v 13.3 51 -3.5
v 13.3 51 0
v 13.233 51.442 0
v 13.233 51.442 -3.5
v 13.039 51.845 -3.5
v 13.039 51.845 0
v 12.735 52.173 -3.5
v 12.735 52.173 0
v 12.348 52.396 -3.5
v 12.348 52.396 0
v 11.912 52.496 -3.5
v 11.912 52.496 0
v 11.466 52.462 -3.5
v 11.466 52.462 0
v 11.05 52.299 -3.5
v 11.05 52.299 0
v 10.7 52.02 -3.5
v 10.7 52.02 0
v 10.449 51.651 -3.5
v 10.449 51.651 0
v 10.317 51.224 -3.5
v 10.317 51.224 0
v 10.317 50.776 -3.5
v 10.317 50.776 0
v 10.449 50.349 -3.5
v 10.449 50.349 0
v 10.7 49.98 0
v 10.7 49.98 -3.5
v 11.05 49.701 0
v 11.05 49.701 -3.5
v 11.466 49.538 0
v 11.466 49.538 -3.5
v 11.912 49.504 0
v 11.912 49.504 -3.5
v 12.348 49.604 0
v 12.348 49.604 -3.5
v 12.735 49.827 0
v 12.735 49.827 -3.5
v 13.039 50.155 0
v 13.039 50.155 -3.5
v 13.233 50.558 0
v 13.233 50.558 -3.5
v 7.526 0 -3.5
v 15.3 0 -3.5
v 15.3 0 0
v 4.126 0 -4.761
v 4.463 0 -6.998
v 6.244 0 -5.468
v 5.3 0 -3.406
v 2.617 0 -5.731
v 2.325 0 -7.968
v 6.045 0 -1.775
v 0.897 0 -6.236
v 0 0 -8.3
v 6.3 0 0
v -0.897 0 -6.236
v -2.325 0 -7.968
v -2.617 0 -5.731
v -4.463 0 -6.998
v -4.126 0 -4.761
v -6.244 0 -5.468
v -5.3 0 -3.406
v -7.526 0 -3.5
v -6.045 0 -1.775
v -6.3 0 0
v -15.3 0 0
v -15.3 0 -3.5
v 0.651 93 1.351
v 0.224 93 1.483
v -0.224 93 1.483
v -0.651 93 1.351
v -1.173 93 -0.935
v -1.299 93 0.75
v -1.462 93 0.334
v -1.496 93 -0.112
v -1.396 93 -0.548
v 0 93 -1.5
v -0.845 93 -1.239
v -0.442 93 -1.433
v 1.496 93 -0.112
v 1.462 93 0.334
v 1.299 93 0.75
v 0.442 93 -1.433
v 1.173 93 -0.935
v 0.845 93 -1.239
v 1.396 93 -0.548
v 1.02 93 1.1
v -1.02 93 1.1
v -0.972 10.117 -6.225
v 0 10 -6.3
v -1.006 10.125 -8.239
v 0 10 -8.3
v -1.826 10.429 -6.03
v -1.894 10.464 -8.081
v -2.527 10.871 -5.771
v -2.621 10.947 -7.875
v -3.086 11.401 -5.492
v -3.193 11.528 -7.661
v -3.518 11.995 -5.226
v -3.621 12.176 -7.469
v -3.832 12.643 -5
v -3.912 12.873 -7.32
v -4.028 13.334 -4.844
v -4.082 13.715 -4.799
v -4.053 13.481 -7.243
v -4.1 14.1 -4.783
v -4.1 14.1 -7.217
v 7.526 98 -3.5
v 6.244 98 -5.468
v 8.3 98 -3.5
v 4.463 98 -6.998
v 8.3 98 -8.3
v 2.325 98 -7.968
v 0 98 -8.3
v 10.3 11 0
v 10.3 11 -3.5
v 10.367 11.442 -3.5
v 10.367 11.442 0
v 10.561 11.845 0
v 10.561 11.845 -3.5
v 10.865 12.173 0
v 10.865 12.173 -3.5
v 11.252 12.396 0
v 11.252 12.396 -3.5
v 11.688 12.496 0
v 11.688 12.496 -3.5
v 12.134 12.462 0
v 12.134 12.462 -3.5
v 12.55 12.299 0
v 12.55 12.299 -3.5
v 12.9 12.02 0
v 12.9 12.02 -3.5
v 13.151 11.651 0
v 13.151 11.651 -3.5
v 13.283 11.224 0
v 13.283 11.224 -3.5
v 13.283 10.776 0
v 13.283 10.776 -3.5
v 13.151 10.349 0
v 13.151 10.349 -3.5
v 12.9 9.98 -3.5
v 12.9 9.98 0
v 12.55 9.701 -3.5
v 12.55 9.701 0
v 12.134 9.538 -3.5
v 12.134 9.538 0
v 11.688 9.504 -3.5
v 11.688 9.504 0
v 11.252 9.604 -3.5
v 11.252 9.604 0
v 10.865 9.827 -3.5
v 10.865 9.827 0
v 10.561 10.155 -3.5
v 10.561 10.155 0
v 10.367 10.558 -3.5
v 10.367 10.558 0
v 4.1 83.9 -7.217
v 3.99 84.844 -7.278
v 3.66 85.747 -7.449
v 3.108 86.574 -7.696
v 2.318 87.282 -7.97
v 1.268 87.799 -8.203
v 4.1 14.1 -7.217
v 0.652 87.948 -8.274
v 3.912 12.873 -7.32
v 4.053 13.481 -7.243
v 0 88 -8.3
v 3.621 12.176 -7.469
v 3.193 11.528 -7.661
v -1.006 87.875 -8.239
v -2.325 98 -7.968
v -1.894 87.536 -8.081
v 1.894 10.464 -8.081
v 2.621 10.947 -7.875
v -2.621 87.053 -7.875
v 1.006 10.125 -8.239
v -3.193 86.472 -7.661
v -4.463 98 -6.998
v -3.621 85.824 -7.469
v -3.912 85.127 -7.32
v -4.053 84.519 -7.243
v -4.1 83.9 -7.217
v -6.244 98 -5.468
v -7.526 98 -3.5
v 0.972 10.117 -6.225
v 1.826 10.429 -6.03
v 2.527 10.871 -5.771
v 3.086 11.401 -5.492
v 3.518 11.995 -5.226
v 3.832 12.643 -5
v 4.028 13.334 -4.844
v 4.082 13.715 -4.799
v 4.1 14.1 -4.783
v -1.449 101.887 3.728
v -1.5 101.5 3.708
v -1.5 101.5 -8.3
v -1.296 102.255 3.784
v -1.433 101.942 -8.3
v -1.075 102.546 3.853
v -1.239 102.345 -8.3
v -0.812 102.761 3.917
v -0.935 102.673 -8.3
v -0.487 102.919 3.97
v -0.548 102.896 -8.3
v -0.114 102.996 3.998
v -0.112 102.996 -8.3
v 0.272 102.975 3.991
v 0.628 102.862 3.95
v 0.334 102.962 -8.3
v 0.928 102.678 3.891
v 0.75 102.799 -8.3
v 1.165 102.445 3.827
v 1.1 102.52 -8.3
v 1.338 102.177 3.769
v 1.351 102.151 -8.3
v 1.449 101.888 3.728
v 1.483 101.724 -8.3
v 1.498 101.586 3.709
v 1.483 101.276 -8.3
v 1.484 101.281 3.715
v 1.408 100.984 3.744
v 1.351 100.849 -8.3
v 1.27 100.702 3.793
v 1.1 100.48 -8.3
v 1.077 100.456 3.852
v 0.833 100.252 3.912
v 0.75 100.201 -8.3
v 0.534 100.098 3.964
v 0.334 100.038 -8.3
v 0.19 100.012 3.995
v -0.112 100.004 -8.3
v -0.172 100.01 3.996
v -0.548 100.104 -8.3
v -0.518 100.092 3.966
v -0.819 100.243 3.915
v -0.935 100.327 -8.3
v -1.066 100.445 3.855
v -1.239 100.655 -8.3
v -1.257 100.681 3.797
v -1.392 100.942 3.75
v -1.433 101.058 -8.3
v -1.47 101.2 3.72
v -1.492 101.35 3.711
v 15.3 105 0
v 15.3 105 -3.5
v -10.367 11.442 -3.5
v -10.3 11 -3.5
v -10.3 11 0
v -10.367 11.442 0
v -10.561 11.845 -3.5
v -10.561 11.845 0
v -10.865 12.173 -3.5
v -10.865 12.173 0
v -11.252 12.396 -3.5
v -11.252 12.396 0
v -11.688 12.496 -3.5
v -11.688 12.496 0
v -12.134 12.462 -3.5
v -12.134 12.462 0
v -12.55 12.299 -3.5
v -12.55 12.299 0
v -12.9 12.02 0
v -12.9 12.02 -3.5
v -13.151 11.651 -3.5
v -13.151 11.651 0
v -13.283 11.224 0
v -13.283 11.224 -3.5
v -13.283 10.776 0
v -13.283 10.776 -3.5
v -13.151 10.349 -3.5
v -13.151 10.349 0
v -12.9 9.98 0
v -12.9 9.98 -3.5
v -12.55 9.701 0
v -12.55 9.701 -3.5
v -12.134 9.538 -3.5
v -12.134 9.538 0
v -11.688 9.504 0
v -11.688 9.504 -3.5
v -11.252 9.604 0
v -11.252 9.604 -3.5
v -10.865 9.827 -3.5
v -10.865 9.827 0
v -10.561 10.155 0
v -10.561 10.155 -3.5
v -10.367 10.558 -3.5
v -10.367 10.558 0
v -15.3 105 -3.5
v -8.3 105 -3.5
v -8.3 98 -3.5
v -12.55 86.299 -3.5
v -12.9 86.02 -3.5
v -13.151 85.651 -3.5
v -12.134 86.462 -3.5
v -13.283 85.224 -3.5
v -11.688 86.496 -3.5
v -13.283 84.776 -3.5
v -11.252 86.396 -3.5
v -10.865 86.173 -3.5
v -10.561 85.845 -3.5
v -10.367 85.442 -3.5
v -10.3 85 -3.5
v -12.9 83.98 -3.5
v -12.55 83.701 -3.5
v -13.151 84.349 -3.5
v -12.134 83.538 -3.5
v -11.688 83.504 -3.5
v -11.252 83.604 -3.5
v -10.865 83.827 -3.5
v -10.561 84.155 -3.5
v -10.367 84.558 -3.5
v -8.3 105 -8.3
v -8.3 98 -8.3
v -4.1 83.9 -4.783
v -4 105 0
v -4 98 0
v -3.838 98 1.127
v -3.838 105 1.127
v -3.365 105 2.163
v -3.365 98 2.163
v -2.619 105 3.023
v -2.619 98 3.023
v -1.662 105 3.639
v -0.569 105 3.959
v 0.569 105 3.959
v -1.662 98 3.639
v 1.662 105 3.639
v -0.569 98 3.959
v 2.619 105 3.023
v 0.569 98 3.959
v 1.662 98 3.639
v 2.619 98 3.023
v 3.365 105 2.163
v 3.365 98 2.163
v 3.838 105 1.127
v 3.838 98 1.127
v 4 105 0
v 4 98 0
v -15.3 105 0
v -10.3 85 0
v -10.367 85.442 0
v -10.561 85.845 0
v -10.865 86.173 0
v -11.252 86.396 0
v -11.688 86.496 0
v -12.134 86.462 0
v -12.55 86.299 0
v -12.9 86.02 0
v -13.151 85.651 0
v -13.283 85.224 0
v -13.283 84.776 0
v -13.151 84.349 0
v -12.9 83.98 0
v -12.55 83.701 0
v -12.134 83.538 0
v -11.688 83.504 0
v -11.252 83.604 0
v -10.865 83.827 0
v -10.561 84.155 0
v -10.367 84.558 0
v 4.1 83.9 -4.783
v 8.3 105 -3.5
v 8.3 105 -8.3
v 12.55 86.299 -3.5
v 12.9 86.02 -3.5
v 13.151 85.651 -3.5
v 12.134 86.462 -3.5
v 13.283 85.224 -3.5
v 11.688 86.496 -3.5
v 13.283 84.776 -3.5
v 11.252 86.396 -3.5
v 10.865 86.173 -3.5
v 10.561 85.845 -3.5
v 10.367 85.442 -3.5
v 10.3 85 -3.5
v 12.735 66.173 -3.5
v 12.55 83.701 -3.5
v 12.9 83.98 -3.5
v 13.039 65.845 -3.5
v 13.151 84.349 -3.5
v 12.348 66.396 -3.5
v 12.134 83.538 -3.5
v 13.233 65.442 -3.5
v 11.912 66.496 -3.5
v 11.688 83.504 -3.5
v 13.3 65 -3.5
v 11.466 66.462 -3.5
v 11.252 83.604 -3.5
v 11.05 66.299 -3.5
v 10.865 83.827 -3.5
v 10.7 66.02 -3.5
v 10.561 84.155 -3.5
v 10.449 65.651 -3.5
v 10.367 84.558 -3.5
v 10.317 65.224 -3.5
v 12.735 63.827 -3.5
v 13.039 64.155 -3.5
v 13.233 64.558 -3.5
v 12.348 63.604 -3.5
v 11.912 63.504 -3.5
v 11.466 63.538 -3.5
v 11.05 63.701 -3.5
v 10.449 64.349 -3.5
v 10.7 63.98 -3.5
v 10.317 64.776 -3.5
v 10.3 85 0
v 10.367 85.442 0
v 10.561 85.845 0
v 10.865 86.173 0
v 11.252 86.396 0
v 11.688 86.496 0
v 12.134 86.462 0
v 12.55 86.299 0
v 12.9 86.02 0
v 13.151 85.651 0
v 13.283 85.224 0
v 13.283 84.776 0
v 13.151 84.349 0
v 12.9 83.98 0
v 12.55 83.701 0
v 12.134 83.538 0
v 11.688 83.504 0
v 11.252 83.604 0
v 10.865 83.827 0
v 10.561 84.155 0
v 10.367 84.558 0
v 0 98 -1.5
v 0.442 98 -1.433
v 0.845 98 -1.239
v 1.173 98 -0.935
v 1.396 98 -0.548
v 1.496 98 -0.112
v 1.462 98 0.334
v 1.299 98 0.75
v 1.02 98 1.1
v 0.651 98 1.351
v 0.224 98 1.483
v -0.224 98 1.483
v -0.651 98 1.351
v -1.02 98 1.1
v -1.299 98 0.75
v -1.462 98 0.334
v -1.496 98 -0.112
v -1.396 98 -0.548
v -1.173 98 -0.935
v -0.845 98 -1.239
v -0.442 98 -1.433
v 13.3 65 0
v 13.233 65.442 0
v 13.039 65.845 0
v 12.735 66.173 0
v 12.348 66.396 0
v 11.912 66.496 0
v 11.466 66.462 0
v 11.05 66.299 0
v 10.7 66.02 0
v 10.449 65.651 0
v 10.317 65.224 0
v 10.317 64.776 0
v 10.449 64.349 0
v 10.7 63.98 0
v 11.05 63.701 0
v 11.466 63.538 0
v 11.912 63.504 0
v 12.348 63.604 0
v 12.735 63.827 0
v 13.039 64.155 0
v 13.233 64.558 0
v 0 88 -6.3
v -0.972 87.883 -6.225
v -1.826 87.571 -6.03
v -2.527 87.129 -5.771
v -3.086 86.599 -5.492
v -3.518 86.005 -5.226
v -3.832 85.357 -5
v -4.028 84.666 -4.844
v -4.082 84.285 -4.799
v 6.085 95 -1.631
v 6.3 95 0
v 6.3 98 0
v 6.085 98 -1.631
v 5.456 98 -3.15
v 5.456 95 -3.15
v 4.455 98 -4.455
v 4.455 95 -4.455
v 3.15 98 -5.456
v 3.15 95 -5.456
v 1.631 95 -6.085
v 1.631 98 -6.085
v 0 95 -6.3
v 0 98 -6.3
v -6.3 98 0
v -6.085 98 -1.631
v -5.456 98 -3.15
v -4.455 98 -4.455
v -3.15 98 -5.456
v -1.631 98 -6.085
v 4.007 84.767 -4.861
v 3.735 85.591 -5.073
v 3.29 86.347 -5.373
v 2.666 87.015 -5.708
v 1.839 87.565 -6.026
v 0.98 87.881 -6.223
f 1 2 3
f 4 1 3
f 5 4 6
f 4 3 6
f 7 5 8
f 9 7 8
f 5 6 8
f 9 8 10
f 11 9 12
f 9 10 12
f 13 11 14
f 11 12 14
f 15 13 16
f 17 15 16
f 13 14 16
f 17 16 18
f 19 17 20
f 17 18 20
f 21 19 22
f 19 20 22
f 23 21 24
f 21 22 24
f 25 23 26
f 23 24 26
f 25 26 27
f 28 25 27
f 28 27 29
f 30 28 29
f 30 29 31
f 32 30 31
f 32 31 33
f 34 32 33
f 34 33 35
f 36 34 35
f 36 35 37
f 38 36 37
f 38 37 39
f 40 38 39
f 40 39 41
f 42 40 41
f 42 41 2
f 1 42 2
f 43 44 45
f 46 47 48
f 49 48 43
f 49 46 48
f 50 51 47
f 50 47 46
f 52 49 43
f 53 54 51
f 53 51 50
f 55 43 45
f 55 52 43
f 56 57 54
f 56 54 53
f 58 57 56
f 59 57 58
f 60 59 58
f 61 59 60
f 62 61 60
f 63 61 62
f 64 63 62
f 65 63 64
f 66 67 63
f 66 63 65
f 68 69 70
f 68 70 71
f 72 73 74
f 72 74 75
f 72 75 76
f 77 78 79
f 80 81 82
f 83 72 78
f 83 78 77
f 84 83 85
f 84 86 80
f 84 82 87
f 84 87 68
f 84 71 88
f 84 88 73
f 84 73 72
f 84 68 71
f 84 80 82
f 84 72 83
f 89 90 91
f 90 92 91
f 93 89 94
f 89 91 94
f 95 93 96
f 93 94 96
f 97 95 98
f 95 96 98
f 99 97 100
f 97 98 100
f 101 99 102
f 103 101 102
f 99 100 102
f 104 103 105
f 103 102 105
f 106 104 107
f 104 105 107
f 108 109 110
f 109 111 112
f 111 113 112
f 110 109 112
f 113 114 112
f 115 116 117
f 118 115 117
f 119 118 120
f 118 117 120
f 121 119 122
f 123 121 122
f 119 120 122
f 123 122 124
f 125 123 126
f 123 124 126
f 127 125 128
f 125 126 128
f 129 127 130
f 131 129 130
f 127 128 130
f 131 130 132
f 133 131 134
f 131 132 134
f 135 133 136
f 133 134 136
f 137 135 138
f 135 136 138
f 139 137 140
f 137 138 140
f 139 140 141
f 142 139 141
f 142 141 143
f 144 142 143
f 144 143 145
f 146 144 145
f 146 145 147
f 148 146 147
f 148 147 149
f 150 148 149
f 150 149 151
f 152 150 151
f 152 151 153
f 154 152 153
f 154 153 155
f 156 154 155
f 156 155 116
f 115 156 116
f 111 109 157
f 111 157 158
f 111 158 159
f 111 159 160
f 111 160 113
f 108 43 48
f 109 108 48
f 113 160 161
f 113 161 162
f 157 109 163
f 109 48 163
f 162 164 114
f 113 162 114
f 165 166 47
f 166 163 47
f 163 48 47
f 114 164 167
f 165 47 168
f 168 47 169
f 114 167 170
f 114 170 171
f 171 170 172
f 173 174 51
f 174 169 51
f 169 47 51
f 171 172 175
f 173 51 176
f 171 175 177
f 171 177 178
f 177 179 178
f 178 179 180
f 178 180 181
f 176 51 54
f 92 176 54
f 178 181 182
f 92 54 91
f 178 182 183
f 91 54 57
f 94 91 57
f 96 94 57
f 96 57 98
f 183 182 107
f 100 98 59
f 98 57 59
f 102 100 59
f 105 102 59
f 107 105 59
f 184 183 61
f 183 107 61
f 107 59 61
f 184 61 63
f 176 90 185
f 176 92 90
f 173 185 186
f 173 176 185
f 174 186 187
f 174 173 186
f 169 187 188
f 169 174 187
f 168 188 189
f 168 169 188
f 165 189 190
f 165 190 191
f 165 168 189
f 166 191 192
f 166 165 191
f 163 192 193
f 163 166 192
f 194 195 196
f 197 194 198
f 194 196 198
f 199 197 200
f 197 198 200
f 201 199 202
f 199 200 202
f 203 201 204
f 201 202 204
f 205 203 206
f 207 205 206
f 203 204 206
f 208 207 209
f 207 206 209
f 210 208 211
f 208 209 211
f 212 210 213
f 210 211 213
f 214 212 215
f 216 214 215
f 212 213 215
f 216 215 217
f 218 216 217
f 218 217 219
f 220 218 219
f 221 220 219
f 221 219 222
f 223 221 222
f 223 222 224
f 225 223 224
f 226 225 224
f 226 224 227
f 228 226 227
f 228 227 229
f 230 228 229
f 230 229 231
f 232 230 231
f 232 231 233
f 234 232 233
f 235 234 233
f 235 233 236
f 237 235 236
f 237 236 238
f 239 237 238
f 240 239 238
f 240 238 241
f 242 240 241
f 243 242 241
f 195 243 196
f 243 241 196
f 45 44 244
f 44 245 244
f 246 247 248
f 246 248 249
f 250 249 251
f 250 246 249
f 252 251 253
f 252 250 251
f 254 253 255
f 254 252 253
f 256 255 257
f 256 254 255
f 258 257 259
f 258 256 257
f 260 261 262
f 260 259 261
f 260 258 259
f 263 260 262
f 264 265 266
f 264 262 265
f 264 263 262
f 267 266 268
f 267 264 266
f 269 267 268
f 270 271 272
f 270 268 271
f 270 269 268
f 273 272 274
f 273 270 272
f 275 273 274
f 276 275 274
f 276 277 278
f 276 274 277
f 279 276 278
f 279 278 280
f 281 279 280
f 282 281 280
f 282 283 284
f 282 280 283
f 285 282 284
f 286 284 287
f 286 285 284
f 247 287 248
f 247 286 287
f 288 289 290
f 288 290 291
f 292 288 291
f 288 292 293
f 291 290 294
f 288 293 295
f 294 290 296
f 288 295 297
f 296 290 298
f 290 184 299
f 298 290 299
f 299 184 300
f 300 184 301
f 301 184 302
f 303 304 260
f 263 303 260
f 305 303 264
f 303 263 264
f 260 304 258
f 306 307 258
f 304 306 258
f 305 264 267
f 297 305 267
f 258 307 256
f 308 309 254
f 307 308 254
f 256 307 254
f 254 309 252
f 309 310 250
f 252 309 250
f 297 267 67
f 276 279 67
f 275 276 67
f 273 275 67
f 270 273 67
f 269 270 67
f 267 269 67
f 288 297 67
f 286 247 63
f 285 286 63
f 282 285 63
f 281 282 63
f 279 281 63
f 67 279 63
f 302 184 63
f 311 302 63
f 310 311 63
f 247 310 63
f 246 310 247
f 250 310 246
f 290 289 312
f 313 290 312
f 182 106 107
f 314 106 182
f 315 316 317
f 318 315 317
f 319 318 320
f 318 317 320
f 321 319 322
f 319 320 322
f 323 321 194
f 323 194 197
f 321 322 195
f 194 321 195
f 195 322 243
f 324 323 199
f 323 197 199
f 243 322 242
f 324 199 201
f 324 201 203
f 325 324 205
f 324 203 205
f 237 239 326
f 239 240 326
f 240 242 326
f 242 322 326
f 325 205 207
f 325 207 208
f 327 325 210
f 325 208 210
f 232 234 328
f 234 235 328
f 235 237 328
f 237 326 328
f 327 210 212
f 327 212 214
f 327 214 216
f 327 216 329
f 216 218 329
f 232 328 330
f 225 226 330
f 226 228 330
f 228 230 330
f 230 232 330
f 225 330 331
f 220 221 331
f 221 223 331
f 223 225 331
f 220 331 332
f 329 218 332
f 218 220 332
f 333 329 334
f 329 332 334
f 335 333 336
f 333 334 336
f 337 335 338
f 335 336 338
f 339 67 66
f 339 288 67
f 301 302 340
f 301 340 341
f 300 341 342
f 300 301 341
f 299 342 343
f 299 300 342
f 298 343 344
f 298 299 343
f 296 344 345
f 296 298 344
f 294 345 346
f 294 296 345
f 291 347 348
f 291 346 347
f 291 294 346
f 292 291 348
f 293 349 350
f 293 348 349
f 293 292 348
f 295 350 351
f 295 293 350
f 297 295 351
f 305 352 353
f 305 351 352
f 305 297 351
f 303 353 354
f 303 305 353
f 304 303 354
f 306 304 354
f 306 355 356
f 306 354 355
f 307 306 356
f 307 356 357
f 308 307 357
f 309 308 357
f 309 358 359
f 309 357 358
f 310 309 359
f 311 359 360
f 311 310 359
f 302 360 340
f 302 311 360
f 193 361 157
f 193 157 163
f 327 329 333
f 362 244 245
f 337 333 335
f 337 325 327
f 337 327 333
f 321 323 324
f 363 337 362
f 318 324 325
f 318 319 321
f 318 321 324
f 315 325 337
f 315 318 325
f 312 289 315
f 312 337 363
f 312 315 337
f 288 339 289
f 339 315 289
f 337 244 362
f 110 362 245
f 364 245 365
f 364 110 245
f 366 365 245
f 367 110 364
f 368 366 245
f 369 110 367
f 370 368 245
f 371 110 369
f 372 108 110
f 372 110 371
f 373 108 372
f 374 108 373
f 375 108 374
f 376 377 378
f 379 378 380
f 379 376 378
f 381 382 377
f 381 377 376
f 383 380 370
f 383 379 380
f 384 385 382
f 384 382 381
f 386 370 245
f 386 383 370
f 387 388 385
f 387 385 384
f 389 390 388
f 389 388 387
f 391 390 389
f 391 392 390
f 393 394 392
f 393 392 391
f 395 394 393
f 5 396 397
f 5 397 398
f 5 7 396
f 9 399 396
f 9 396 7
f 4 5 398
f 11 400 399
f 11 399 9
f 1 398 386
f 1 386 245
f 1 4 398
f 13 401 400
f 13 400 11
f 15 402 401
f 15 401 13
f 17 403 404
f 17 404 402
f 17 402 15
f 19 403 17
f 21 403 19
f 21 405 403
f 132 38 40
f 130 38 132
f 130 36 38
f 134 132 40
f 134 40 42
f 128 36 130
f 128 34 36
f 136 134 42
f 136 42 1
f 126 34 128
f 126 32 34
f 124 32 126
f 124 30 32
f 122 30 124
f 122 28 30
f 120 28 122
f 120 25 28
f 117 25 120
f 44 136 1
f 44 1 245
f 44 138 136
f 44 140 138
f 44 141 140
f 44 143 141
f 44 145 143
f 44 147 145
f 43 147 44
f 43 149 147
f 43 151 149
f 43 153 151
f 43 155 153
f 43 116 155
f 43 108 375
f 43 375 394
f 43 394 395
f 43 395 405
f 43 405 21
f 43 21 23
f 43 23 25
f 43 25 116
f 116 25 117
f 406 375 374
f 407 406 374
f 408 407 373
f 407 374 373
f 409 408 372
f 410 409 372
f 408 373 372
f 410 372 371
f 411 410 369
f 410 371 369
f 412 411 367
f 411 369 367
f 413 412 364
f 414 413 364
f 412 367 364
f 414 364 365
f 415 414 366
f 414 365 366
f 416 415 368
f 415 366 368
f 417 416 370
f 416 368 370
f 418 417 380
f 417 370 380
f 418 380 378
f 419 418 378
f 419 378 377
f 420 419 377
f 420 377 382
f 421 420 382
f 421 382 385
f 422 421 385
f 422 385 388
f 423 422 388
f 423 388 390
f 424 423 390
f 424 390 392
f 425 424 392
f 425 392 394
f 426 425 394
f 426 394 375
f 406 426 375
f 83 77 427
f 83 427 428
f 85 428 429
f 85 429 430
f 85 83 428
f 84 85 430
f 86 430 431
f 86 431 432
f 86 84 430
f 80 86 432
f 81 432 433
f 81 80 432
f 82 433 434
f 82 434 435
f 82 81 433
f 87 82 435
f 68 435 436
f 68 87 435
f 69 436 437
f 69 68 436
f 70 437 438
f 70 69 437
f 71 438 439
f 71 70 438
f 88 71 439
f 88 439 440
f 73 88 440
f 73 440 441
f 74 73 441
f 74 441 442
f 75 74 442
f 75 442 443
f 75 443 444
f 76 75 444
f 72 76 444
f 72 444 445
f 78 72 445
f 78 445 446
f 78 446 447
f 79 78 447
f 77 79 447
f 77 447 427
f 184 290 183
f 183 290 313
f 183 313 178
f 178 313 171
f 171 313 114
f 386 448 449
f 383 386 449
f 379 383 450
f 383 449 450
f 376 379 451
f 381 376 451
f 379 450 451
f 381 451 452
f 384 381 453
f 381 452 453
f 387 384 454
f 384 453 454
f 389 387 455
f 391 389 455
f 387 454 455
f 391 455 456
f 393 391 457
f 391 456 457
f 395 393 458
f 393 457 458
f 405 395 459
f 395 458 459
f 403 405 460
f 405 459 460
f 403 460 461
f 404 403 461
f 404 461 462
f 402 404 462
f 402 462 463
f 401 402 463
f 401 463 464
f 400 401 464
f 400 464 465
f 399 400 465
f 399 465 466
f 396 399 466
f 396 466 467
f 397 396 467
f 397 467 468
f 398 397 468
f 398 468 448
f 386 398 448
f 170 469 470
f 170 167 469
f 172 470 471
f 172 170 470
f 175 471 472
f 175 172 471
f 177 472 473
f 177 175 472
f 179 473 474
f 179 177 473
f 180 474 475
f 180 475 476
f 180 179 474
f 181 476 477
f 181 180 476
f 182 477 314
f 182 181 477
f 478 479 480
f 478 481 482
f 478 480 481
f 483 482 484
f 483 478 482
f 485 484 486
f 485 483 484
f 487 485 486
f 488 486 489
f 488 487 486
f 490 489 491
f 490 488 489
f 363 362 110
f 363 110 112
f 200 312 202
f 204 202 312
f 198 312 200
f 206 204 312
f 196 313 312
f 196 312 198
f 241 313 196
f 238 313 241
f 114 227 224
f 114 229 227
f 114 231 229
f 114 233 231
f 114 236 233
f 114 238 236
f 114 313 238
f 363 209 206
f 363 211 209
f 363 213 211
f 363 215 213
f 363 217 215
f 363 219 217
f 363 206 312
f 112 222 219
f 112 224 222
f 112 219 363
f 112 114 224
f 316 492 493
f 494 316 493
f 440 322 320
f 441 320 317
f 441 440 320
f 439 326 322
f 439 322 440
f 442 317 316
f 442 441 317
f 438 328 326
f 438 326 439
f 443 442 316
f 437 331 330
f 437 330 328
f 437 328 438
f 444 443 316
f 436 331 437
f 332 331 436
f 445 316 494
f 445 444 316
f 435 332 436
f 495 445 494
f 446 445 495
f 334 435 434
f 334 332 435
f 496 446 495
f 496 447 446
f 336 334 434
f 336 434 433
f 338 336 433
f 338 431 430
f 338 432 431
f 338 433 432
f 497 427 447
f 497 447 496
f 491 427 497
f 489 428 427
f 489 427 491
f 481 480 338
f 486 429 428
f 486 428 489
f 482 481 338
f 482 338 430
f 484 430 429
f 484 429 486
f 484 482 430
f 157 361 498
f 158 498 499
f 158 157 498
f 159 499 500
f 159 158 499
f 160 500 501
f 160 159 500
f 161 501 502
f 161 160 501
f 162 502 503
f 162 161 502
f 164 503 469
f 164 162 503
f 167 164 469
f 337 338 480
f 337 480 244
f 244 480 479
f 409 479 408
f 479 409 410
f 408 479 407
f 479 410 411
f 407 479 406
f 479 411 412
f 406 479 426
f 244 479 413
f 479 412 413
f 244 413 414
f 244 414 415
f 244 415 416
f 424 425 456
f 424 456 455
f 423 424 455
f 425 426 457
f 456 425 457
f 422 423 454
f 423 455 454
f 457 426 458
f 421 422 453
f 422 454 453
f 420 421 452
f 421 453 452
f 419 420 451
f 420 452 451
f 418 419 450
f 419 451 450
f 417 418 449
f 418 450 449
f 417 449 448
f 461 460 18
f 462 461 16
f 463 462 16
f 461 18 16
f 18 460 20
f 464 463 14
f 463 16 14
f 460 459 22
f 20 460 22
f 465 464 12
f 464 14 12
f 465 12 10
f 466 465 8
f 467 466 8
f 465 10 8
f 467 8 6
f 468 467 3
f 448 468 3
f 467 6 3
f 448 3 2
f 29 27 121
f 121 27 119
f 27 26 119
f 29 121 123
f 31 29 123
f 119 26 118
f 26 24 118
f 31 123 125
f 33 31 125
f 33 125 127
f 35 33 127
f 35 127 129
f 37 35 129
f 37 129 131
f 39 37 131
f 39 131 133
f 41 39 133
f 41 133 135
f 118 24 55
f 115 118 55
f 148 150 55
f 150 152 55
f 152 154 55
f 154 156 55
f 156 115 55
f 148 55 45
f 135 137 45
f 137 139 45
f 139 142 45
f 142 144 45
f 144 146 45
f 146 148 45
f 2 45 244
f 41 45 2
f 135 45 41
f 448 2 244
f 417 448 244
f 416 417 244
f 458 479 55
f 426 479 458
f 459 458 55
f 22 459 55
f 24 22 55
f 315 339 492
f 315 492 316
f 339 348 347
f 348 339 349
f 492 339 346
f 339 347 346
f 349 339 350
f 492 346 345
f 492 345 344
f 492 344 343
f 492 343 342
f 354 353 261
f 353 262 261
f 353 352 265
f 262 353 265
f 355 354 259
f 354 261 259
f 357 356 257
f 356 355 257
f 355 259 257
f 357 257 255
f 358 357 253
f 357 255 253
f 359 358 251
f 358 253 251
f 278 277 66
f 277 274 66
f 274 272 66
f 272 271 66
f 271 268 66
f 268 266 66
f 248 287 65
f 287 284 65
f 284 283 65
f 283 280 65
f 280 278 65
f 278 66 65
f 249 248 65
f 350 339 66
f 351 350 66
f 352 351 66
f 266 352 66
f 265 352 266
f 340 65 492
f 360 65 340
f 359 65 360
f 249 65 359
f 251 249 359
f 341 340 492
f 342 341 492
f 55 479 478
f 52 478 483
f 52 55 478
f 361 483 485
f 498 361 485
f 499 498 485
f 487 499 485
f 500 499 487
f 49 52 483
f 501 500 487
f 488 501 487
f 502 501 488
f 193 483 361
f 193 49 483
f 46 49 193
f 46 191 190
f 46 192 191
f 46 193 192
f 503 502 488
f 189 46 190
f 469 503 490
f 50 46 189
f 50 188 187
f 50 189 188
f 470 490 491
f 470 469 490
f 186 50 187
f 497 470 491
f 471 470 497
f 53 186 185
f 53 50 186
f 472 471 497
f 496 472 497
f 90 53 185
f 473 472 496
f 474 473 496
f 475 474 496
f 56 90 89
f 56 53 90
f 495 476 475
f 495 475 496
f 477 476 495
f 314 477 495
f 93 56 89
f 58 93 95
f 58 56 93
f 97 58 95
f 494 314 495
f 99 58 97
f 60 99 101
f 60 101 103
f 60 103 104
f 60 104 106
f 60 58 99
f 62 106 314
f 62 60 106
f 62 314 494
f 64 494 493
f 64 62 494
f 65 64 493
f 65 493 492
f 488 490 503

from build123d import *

# Parameters (mm, degrees)
SKETCH1_R                = 8.3
SKETCH1_R_2              = 6.3
BOSS_EXTRUDE1_DEPTH      = 95
SKETCH3_R                = 8.3
BOSS_EXTRUDE2_DEPTH      = 3
SKETCH5_W                = 16.6
SKETCH5_H                = 16.6
BOSS_EXTRUDE4_DEPTH      = 7
CUT_EXTRUDE1_DEPTH       = 107.627623063
FILLET1_R                = 4.1
SKETCH4_R                = 6.3
SKETCH4_R_2              = 1.5
CUT_EXTRUDE3_DEPTH       = 3
BOSS_EXTRUDE6_START      = 2
SKETCH8_R                = 1.5
BOSS_EXTRUDE6_DEPTH      = 2
BOSS_EXTRUDE7_START      = -0.774045
BOSS_EXTRUDE7_DEPTH      = 7.774045
F_3_0_3_DIAMETER_HOLE1_D = 3
F_3_0_3_DIAMETER_HOLE2_D = 3
F_3_0_3_DIAMETER_HOLE3_D = 3
CUT_EXTRUDE4_DEPTH       = 107.432983617


with BuildPart() as part:
    # Sketch1 → Boss-Extrude1 (new body)
    with BuildSketch(Plane(origin=(0, 0, 0), x_dir=(1, 0, 0), z_dir=(0, 1, 0))):
        with Locations(Location((0, 0, 0), (0, 0, 270))):
            Circle(SKETCH1_R)
        with Locations(Location((0, 0, 0), (0, 0, 270))):
            Circle(SKETCH1_R_2, mode=Mode.SUBTRACT)
    extrude(amount=BOSS_EXTRUDE1_DEPTH)

    # Sketch3 → Boss-Extrude2 (add)
    with BuildSketch(Plane(origin=(0, 95, 0), x_dir=(1, 0, 0), z_dir=(0, 1, 0))):
        with Locations(Location((0, 0, 0), (0, 0, 270))):
            Circle(SKETCH3_R)
    extrude(amount=BOSS_EXTRUDE2_DEPTH)

    # Sketch5 → Boss-Extrude4 (add)
    with BuildSketch(Plane(origin=(0, 98, 0), x_dir=(1, 0, 0), z_dir=(0, 1, 0))):
        Rectangle(SKETCH5_W, SKETCH5_H)
    extrude(amount=BOSS_EXTRUDE4_DEPTH)

    # Sketch6 → Cut-Extrude1 (cut, through all)
    with BuildSketch(Plane.XY.offset(8.3)):
        Polygon((4.1, 10), (0, 10), (-4.1, 10), (-4.1, 88), (4.1, 88), align=None)
    extrude(amount=-CUT_EXTRUDE1_DEPTH, mode=Mode.SUBTRACT)

    # Fillet1
    fillet1_edges = [part.edges().sort_by_distance(p)[0] for p in [
        (4.1, 88, 5.999975859),
        (4.1, 88, -5.999975859),
        (-4.1, 88, 5.999975859),
        (-4.1, 88, -5.999975859),
        (4.1, 10, -5.999975859),
        (4.1, 10, 5.999975859),
        (-4.1, 10, -5.999975859),
        (-4.1, 10, 5.999975859),
    ]]
    fillet(fillet1_edges, radius=FILLET1_R - 0.0001)  # a hair under: the kernel refuses the full size

    # Sketch4 → Cut-Extrude3 (cut)
    with BuildSketch(Plane(origin=(0, 95, 0), x_dir=(-1, 0, 0), z_dir=(0, -1, 0))):
        with Locations(Location((0, 0, 0), (0, 0, 90))):
            Circle(SKETCH4_R)
        with Locations(Location((0, 0, 0), (0, 0, 90))):
            Circle(SKETCH4_R_2, mode=Mode.SUBTRACT)
    extrude(amount=-CUT_EXTRUDE3_DEPTH, mode=Mode.SUBTRACT)

    # Sketch8 → Boss-Extrude6 (add)
    with BuildSketch(Plane(origin=(0, 95, 0), x_dir=(-1, 0, 0), z_dir=(0, -1, 0)).offset(BOSS_EXTRUDE6_START)):
        with Locations(Location((0, 0, 0), (0, 0, 90))):
            Circle(SKETCH8_R)
    extrude(amount=-BOSS_EXTRUDE6_DEPTH)

    # Sketch9 → Boss-Extrude7 (add)
    with BuildSketch(Plane.ZY.offset(8.3).offset(BOSS_EXTRUDE7_START)):
        Polygon((0, 0), (3.5, 0), (3.5, 105), (-3.5, 105), (-3.5, 0), align=None)
    boss_extrude7 = extrude(amount=BOSS_EXTRUDE7_DEPTH)

    # Mirror1: Boss-Extrude7 across plane
    add(boss_extrude7.mirror(Plane(origin=(0, 0, 0), x_dir=(0, 0, 1), z_dir=(1, 0, 0))))

    # Ø3.0 (3) Diameter Hole1 (through all)
    with Locations(Plane.XY.offset(8.3)):
        with Locations((0, 101.5)):
            Hole(F_3_0_3_DIAMETER_HOLE1_D / 2)

    # Ø3.0 (3) Diameter Hole2 (through all)
    with Locations(Plane.XY.offset(3.5)):
        with Locations((11.8, 85), (11.8, 11)):
            f_3_0_3_diameter_hole2 = Hole(F_3_0_3_DIAMETER_HOLE2_D / 2)

    # Ø3.0 (3) Diameter Hole3 (through all)
    with Locations(Plane(origin=(0, 0, -3.5), x_dir=(-1, 0, 0), z_dir=(0, 0, -1))):
        with Locations((-11.8, 65), (-11.8, 51)):
            Hole(F_3_0_3_DIAMETER_HOLE3_D / 2)

    # Mirror2: Ø3.0 (3) Diameter Hole2 across plane
    add(f_3_0_3_diameter_hole2.mirror(Plane(origin=(0, 0, 0), x_dir=(0, 0, 1), z_dir=(1, 0, 0))), mode=Mode.SUBTRACT)

    # Sketch17 → Cut-Extrude4 (cut, through all)
    with BuildSketch(Plane(origin=(0, 0, 0), x_dir=(-1, 0, 0), z_dir=(0, -1, 0))):
        with BuildLine():
            Line((15.3, -73.411355502), (15.3, 0))
            Line((15.3, 0), (15.3, 8.3))
            Line((15.3, 8.3), (-15.3, 8.3))
            Line((-15.3, 8.3), (-15.3, -8.3))
            Line((-15.3, -8.3), (15.3, -8.3))
            Line((15.3, -8.3), (15.3, 0))
            Line((15.3, 0), (4, 0))
            ThreePointArc((4, 0), (0, -4), (-4, 0))
            Line((-4, 0), (-15.3, 0))
            Line((-15.3, 0), (-88.711355502, 0))
            Line((-88.711355502, 0), (-173.375060896, -119.954013921))
            Line((-173.375060896, -119.954013921), (-69.363705394, -193.365369423))
            Line((-69.363705394, -193.365369423), (15.3, -73.411355502))
        make_face()
    extrude(amount=-CUT_EXTRUDE4_DEPTH, mode=Mode.SUBTRACT)


with BuildPart() as cut_extrude4_kept_piece:
    # of the separate pieces the step leaves, the one the design keeps (cut_extrude4_pieces_kept)
    add(part.part.solids().sort_by_distance((15.3, 0, -3.5))[0])


solid = cut_extrude4_kept_piece.part
